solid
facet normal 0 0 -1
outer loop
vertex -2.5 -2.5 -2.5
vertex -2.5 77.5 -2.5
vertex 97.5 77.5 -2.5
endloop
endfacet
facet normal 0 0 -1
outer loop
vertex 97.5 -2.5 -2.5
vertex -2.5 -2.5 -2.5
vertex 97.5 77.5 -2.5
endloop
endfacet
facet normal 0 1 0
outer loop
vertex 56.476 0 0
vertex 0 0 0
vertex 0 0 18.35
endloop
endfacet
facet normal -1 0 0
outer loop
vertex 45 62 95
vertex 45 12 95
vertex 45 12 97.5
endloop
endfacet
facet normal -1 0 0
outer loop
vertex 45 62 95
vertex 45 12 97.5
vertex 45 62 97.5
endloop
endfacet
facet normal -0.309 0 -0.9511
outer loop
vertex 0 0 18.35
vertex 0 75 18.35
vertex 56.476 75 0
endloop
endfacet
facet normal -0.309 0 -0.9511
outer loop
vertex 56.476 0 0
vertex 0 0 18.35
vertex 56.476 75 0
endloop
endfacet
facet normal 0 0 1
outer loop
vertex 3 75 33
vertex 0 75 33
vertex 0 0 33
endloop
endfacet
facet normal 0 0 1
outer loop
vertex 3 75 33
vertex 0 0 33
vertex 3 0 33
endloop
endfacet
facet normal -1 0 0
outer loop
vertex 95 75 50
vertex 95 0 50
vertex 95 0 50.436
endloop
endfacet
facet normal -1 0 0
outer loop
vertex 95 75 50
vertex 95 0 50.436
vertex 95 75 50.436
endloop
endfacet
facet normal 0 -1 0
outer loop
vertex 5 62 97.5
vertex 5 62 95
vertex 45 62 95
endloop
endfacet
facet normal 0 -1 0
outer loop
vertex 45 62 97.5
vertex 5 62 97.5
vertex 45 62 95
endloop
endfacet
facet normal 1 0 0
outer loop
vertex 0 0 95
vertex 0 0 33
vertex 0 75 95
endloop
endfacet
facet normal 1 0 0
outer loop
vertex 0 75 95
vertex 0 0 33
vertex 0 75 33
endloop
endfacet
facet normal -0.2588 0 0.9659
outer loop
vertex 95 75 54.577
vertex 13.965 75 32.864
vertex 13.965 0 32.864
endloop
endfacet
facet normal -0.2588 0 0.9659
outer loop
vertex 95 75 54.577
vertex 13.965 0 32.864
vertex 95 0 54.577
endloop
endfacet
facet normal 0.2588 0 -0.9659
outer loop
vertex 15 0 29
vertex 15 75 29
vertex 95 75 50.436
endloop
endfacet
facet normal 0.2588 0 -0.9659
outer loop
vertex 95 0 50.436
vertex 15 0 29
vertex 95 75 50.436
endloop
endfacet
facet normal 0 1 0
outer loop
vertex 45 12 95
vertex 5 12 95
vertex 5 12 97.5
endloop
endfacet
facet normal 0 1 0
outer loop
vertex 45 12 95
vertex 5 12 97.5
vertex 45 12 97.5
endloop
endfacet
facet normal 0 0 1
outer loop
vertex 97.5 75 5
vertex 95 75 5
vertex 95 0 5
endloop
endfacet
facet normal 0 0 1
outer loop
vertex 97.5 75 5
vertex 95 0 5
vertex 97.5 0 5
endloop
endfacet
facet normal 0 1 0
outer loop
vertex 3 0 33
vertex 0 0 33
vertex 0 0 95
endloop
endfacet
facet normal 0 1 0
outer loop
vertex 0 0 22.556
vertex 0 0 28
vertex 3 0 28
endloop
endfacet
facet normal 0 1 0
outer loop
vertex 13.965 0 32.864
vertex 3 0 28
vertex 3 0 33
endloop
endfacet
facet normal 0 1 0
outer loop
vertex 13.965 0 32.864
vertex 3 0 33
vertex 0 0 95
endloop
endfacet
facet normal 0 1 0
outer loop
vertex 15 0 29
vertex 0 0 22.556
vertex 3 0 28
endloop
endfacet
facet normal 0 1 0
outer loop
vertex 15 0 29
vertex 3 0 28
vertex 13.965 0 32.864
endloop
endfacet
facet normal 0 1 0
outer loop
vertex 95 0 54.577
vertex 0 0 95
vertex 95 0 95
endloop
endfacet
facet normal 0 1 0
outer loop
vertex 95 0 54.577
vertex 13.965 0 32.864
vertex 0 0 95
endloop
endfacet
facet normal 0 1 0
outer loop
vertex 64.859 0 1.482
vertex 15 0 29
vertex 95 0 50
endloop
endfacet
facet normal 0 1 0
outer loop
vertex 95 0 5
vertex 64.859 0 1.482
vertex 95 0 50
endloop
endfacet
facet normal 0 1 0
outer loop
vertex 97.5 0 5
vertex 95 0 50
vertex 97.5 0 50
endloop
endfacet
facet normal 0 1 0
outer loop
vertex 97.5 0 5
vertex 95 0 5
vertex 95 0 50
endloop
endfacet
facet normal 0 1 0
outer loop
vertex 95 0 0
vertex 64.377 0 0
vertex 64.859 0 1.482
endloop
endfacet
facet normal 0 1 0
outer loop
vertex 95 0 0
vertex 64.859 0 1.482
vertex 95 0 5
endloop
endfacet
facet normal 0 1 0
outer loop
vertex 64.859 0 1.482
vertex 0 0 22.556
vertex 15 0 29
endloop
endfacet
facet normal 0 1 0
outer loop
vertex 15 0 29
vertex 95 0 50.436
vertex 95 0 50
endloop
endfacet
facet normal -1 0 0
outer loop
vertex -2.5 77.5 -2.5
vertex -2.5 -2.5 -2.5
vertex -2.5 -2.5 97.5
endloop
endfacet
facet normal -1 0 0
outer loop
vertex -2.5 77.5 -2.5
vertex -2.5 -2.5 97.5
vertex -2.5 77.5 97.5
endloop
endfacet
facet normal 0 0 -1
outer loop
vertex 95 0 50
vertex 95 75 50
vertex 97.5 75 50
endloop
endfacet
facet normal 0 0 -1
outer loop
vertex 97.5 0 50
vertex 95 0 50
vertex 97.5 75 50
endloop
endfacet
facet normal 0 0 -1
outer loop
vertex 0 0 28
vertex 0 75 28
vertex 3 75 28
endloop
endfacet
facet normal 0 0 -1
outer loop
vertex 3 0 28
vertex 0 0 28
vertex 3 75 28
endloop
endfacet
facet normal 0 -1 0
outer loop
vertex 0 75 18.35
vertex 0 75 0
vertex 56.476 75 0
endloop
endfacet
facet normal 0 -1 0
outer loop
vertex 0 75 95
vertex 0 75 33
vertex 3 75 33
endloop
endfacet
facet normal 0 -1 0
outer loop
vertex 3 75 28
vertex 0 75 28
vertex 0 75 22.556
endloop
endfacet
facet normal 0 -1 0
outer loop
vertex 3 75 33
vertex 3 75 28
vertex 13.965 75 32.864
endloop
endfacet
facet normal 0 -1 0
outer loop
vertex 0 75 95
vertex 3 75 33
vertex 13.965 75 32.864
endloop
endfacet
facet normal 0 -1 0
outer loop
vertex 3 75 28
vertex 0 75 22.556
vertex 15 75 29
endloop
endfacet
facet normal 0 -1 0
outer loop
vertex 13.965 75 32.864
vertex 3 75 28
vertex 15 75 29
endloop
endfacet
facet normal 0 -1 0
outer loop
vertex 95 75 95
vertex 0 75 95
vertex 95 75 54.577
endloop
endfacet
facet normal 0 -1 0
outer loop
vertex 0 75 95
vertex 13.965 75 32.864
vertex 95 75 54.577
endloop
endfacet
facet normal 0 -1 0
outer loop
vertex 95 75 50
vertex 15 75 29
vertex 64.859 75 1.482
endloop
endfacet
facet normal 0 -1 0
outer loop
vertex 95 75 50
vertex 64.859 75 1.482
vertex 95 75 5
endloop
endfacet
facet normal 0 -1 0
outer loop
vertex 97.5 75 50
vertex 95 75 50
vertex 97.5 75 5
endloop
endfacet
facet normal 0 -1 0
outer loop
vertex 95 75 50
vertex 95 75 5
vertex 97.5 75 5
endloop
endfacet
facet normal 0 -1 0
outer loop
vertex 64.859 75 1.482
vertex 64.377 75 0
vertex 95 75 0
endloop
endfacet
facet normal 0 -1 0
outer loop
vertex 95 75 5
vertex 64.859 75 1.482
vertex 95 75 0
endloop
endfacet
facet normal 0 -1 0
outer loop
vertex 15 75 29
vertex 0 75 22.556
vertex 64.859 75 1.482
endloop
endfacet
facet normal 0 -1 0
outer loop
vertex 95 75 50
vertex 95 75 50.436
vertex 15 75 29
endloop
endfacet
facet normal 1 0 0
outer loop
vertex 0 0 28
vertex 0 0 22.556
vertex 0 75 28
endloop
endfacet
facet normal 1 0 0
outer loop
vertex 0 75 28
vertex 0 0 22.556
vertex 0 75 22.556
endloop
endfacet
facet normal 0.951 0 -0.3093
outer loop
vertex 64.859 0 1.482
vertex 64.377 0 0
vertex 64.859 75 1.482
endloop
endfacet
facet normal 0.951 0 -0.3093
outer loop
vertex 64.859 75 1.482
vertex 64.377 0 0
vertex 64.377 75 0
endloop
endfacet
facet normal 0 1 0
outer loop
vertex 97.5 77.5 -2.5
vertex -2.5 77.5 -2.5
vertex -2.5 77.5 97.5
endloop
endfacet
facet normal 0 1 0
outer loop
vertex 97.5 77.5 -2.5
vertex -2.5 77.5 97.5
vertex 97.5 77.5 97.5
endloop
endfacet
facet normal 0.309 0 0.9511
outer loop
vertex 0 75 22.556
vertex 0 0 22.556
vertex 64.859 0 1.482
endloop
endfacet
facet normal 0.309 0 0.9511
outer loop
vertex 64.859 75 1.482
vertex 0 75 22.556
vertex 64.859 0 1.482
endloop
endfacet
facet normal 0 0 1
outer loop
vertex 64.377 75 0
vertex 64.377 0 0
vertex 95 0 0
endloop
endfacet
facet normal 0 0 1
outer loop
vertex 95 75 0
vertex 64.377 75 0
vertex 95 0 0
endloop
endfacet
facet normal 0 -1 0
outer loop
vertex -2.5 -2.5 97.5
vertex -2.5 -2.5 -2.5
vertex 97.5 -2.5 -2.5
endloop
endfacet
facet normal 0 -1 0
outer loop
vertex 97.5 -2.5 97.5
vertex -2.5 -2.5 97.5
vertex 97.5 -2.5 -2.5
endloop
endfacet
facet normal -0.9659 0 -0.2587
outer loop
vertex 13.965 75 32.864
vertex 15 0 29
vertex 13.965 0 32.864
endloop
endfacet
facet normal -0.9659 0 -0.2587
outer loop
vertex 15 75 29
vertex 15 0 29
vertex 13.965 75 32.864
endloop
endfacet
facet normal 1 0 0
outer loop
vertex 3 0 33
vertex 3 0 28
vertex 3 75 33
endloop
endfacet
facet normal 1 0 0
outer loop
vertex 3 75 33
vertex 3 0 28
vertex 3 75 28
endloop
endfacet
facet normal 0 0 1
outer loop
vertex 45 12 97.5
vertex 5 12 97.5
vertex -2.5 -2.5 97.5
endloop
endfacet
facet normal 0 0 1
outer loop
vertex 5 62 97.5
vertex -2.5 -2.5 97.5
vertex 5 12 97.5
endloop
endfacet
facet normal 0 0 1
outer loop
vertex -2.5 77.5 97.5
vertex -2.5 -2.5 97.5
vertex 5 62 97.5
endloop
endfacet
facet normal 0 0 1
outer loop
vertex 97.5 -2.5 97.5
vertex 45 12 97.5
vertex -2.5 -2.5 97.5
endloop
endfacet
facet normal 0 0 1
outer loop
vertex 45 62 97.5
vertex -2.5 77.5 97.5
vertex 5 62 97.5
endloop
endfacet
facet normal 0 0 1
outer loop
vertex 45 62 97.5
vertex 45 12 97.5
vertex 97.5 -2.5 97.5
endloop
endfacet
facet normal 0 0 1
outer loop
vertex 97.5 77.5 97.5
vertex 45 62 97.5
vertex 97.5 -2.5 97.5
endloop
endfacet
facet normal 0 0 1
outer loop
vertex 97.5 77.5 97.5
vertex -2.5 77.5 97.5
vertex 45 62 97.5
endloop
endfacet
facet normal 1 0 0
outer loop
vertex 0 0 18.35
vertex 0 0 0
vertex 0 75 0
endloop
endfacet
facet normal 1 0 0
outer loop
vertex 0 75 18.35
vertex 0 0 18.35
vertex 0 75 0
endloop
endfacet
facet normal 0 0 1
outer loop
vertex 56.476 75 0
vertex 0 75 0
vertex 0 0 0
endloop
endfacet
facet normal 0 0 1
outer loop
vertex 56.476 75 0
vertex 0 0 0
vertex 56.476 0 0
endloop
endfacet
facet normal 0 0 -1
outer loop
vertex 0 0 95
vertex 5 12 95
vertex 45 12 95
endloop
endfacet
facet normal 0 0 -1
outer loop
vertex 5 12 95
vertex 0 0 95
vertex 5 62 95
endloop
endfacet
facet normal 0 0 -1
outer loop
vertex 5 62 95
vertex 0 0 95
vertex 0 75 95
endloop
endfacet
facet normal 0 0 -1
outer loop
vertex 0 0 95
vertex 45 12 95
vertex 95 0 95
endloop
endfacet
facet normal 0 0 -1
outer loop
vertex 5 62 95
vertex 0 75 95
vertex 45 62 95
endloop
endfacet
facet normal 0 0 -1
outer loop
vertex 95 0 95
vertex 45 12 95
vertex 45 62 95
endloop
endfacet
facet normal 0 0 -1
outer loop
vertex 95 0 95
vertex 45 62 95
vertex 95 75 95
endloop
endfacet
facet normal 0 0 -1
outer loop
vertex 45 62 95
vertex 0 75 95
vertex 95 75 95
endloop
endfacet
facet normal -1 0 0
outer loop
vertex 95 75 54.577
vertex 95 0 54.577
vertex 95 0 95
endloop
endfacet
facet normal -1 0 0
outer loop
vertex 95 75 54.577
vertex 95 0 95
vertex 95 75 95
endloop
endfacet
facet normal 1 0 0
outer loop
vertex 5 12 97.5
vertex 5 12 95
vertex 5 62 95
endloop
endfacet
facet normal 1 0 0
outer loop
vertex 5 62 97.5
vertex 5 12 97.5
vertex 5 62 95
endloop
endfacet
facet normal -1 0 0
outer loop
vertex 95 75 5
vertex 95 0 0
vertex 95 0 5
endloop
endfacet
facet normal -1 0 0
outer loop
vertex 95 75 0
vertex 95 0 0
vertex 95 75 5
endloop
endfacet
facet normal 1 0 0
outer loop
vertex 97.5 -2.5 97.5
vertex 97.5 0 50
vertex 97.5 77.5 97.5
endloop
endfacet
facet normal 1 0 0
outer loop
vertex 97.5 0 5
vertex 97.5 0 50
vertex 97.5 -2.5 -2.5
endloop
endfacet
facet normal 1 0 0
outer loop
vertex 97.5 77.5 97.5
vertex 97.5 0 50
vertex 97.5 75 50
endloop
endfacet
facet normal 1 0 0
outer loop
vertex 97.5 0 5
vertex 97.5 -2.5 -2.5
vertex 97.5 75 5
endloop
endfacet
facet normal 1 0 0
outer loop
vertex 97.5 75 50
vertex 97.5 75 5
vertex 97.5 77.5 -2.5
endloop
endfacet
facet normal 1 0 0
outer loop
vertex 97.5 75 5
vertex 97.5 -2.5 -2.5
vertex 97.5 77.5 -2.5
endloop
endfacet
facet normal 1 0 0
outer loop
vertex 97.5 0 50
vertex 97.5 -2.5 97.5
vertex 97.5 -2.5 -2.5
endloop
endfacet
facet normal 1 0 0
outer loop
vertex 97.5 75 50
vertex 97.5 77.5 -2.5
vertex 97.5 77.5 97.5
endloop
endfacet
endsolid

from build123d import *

# Parameters (mm, degrees)
BOX006_W           = 9
BOX006_H           = 75
BOX006_DEPTH       = 45
BOX002_W           = 40
BOX002_H           = 50
BOX002_DEPTH       = 5
BOX001_W           = 95
BOX001_H           = 75
BOX001_DEPTH       = 95
BOX_W              = 100
BOX_H              = 80
BOX_DEPTH          = 100
BOX003_W           = 84
BOX003_H           = 75
BOX003_DEPTH       = 4
BOX003_PITCH_ANGLE = -15
BOX004_W           = 3
BOX004_H           = 75
BOX004_DEPTH       = 5
BOX005_W           = 69
BOX005_H           = 75
BOX005_DEPTH       = 4
BOX005_PITCH_ANGLE = 18


with BuildPart() as cube005:
    # Box006 → Box006 (new body)
    with BuildSketch(Plane(origin=(94, 0, 5), x_dir=(1, 0, 0), z_dir=(0, 0, 1))):
        with Locations((4.5, 37.5)):
            Rectangle(BOX006_W, BOX006_H)
    extrude(amount=BOX006_DEPTH)


with BuildPart() as cube001:
    # Box002 → Box002 (new body)
    with BuildSketch(Plane(origin=(5, 12, 94), x_dir=(1, 0, 0), z_dir=(0, 0, 1))):
        with Locations((20, 25)):
            Rectangle(BOX002_W, BOX002_H)
    extrude(amount=BOX002_DEPTH)


with BuildPart() as inside_hole:
    # Box001 → Box001 (new body)
    with BuildSketch(Plane.XY):
        with Locations((47.5, 37.5)):
            Rectangle(BOX001_W, BOX001_H)
    extrude(amount=BOX001_DEPTH)


with BuildPart() as cut001:
    # Box → Box (new body)
    with BuildSketch(Plane(origin=(-2.5, -2.5, -2.5), x_dir=(1, 0, 0), z_dir=(0, 0, 1))):
        with Locations((50, 40)):
            Rectangle(BOX_W, BOX_H)
    extrude(amount=BOX_DEPTH)

    # Cut: cut inside hole
    add(inside_hole.part, mode=Mode.SUBTRACT)

    # Cut001: cut Cube001
    add(cube001.part, mode=Mode.SUBTRACT)


with BuildPart() as fusion:
    # Box003 → Box003 (new body)
    with BuildSketch(Plane.XY):
        with Locations((42, 37.5)):
            Rectangle(BOX003_W, BOX003_H)
    extrude(amount=BOX003_DEPTH)


with BuildPart() as fusion_1:
    # Box003 pitch: moved
    add(fusion.part.rotate(Axis((0, 0, 0), (0, 1, 0)), BOX003_PITCH_ANGLE))


with BuildPart() as fusion_2:
    # Box003 placement: moved
    add(fusion_1.part.moved(Location((15, 0, 29))))

    # Fusion: union Cut001
    add(cut001.part)


with BuildPart() as fusion001:
    # Box004 → Box004 (new body)
    with BuildSketch(Plane.XY.offset(28)):
        with Locations((1.5, 37.5)):
            Rectangle(BOX004_W, BOX004_H)
    extrude(amount=BOX004_DEPTH)

    # Fusion001: union Fusion
    add(fusion_2.part)


with BuildPart() as compartment:
    # Box005 → Box005 (new body)
    with BuildSketch(Plane.XY):
        with Locations((34.5, 37.5)):
            Rectangle(BOX005_W, BOX005_H)
    extrude(amount=BOX005_DEPTH)


with BuildPart() as compartment_1:
    # Box005 pitch: moved
    add(compartment.part.rotate(Axis((0, 0, 0), (0, 1, 0)), BOX005_PITCH_ANGLE))


with BuildPart() as compartment_2:
    # Box005 placement: moved
    add(compartment_1.part.moved(Location((-2, 0, 19))))

    # Fusion002: union Fusion001
    add(fusion001.part)

    # Cut002: cut Cube005
    add(cube005.part, mode=Mode.SUBTRACT)


solid = compartment_2.part
